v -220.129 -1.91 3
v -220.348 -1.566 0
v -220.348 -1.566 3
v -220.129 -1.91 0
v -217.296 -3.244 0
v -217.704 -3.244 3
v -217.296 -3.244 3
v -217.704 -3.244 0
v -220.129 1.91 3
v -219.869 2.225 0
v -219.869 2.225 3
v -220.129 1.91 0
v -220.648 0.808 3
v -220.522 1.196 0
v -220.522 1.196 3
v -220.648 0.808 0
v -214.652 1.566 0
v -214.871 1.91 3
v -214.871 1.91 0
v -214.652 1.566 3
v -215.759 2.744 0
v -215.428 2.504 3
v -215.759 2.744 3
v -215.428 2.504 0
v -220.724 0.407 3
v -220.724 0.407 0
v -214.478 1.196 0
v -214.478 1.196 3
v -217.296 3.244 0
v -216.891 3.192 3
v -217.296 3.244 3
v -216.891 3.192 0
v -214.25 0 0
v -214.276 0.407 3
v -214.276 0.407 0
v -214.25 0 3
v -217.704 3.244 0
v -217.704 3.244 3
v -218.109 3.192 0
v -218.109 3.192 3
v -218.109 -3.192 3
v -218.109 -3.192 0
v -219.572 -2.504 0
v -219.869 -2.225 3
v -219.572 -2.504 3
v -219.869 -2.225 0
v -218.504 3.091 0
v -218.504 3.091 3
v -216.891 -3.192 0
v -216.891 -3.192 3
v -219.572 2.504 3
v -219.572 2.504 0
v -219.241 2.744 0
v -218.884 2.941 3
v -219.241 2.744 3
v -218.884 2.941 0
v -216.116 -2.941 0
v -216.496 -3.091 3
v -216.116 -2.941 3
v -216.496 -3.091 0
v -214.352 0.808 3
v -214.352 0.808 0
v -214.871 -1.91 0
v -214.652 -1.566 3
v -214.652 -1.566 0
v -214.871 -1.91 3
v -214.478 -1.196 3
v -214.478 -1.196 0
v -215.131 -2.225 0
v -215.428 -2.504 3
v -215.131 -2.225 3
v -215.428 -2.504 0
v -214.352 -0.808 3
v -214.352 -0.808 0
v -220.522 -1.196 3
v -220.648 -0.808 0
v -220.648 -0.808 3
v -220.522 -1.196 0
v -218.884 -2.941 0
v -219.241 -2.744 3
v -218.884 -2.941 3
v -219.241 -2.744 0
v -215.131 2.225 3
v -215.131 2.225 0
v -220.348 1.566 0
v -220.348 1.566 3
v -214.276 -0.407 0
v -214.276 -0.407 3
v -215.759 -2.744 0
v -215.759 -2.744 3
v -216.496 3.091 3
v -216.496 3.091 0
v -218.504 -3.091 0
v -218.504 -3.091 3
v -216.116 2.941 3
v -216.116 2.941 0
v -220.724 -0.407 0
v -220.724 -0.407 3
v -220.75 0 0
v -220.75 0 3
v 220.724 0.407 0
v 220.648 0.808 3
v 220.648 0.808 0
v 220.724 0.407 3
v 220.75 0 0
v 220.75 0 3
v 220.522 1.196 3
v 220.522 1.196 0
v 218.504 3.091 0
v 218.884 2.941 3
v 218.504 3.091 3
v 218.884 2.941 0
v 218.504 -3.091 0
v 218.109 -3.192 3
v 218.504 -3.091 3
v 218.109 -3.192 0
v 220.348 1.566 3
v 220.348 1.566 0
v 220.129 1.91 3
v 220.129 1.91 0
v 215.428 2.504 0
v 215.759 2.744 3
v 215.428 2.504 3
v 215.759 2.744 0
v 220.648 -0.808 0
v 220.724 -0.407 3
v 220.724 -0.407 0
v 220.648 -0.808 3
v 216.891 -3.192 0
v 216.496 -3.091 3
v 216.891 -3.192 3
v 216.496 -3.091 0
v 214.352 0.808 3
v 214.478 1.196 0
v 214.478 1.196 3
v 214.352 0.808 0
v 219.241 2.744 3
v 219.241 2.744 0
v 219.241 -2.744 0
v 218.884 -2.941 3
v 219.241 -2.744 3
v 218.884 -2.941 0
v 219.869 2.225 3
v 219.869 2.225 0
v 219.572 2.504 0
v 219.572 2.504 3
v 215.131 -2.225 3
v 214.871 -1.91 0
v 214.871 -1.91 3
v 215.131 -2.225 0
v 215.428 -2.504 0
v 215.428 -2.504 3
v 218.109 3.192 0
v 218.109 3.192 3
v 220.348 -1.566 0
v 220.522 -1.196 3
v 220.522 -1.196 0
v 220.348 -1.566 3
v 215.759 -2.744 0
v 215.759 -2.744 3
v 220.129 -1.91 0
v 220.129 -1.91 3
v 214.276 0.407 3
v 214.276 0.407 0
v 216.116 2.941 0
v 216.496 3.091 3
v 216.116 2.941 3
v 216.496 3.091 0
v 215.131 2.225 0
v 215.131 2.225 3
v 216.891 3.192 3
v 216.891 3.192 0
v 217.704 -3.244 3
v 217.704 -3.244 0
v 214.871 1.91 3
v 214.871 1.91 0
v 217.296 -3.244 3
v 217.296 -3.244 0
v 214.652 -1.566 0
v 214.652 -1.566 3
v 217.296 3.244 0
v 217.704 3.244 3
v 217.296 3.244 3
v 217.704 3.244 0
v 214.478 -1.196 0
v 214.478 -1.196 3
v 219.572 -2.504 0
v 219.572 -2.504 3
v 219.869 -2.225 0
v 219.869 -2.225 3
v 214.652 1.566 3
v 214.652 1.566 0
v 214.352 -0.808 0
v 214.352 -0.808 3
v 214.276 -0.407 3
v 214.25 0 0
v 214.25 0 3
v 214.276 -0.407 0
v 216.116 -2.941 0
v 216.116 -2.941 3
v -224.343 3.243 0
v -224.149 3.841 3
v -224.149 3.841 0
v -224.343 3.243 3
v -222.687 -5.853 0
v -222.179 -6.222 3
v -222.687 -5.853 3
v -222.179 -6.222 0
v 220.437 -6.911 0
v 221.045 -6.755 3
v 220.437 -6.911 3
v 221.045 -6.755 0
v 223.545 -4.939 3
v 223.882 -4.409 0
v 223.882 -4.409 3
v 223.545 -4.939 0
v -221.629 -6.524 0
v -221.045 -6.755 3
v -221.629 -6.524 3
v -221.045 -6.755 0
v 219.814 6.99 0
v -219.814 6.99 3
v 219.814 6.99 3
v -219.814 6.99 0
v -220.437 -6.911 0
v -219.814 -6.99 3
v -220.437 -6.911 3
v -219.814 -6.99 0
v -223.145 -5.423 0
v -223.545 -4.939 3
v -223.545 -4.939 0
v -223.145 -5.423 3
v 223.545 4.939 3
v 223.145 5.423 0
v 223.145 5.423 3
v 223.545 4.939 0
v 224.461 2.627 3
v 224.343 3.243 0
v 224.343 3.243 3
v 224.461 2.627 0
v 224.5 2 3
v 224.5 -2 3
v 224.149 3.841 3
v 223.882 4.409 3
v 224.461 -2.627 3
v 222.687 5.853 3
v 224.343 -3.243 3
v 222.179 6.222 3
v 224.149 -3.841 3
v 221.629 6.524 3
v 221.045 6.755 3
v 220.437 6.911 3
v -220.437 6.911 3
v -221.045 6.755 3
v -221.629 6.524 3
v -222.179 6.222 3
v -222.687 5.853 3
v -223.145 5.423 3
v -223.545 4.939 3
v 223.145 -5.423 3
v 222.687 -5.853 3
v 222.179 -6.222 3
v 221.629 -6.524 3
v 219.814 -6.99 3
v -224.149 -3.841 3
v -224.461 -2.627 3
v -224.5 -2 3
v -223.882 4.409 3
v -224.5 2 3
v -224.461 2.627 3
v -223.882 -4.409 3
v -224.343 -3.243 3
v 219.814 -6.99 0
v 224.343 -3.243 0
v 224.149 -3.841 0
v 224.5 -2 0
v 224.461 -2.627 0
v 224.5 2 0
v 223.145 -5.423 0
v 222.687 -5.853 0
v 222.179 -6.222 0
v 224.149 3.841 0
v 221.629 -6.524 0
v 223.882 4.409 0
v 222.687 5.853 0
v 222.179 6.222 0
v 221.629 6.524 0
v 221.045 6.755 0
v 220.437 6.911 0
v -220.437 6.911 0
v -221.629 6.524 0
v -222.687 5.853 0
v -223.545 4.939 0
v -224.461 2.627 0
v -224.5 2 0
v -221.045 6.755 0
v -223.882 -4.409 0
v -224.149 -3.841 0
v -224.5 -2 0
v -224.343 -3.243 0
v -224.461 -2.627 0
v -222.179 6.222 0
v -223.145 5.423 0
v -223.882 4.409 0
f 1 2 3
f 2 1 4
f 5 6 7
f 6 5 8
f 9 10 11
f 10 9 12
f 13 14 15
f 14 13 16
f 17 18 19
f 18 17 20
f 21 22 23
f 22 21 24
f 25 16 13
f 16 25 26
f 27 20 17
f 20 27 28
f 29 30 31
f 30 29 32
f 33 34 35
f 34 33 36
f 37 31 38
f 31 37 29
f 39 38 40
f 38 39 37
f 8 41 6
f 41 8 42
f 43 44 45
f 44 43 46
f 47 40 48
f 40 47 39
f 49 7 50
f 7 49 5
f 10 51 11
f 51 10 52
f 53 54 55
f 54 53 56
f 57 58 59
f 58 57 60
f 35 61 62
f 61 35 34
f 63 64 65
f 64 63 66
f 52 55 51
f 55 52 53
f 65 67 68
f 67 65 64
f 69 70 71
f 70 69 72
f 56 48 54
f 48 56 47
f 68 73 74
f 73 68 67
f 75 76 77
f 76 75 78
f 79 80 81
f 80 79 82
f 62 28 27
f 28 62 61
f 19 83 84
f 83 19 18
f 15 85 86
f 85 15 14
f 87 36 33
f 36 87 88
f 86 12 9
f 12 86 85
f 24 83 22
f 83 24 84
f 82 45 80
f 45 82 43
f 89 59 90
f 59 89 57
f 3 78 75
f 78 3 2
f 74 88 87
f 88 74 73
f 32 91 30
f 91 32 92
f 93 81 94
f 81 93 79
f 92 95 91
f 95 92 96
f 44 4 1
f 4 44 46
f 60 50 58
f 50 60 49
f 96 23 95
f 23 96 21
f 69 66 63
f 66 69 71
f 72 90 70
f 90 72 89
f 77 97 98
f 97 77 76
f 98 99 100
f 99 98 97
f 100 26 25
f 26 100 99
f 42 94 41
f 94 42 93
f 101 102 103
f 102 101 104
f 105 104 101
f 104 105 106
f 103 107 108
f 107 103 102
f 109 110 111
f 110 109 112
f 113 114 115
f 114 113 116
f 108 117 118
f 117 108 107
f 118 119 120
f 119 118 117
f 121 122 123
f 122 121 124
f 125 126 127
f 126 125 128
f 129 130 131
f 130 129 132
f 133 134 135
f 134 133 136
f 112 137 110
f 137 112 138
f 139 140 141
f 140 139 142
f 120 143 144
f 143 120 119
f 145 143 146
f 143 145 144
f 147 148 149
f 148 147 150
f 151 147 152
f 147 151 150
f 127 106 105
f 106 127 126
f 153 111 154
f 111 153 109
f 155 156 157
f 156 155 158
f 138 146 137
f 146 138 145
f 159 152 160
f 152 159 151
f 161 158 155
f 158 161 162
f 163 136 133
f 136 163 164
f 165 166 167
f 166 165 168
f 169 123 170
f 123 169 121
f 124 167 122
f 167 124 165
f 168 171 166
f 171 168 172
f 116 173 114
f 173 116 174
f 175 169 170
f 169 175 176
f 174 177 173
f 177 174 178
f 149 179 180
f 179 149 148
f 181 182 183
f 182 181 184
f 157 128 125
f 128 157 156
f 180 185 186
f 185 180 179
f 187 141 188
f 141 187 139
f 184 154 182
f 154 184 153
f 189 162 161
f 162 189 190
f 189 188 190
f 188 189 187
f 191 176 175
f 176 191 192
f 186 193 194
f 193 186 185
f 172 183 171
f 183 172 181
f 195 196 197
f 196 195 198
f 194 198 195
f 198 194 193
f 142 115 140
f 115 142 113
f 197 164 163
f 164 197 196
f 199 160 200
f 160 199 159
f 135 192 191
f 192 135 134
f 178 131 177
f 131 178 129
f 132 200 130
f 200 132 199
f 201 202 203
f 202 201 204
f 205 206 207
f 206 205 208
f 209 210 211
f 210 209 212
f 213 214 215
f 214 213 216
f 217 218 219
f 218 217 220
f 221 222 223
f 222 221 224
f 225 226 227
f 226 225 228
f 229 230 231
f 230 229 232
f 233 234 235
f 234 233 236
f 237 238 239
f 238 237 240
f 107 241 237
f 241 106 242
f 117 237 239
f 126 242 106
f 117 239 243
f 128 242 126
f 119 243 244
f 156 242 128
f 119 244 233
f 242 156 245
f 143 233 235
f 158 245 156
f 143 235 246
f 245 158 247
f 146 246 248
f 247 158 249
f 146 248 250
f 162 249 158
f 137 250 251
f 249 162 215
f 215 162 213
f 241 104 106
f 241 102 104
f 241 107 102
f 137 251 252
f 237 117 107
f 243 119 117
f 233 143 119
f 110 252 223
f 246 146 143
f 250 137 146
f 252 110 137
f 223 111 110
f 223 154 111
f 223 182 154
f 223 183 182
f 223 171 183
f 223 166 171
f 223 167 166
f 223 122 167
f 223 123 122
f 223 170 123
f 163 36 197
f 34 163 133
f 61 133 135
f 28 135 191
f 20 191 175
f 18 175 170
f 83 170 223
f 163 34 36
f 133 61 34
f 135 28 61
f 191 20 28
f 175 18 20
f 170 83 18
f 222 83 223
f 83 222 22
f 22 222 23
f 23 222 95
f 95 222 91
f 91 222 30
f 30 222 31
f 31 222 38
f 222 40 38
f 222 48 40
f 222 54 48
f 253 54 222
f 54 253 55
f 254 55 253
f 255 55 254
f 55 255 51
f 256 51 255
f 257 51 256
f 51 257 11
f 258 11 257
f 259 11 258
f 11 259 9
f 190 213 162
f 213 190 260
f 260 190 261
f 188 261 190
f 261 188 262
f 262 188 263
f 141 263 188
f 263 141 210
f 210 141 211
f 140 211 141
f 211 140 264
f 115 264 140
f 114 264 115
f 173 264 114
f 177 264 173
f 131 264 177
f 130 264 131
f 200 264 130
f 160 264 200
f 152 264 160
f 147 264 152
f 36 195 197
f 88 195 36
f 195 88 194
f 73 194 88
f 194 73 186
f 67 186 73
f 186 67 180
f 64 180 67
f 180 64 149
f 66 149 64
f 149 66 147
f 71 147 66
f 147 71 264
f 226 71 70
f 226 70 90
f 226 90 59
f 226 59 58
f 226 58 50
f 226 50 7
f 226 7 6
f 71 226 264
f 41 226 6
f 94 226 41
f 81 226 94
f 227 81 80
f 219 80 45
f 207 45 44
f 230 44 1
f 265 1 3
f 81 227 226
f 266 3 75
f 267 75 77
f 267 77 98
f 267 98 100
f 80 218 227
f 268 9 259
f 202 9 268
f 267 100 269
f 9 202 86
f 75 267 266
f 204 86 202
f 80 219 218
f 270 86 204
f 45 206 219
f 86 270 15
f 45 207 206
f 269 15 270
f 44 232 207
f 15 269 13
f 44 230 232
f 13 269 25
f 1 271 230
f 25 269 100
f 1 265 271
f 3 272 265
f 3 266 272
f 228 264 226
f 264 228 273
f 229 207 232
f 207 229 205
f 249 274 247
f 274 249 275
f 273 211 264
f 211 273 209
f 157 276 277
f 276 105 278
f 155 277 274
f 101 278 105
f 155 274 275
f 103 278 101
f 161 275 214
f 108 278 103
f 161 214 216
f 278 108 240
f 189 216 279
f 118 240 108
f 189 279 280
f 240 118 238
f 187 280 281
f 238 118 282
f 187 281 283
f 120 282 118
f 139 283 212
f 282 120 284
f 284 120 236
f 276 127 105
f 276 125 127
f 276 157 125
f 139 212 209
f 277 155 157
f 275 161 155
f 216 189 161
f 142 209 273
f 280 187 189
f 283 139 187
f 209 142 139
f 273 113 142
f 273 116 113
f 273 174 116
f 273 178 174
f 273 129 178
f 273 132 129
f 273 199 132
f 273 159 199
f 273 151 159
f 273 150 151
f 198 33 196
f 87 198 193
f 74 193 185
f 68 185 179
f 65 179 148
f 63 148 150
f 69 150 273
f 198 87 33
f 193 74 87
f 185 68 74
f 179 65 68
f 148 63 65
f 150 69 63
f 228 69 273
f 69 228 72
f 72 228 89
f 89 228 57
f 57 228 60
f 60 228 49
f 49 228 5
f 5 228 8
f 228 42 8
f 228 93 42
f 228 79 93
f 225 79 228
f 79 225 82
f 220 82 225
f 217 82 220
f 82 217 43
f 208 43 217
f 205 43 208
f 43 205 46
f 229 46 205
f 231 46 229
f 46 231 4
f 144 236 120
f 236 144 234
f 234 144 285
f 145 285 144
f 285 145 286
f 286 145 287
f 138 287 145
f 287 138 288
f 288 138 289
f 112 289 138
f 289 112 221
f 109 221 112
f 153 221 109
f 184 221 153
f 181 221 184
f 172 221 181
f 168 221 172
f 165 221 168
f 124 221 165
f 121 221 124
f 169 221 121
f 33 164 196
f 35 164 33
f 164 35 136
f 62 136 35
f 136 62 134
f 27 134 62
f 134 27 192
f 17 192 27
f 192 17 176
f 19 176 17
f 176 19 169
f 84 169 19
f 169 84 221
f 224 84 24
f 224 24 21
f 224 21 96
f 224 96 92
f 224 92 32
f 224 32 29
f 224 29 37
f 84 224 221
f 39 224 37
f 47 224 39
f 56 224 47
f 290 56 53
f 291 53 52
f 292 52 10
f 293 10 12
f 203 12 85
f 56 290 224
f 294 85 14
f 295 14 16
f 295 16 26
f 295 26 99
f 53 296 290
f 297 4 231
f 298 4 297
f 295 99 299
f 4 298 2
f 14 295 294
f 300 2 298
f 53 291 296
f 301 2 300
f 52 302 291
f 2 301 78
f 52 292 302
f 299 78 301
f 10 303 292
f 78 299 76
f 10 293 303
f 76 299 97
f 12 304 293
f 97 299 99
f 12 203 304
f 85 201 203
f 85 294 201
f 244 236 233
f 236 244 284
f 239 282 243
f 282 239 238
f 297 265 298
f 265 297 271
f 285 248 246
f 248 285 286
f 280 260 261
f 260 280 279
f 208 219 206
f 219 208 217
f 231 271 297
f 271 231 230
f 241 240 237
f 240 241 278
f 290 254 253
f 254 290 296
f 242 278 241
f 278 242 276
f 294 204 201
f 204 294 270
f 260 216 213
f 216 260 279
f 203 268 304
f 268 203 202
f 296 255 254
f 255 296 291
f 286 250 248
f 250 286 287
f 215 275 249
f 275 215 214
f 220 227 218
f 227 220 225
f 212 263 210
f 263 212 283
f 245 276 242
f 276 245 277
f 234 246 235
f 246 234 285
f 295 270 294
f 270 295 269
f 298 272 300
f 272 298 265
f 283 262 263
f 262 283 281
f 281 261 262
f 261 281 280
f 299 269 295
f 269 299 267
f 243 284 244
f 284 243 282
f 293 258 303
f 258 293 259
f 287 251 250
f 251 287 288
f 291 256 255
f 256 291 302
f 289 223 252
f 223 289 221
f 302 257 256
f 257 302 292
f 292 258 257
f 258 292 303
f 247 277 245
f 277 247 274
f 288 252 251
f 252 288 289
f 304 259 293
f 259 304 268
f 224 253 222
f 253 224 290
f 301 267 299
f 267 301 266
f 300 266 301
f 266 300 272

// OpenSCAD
$fn = 50;


difference() {
	union() {
		hull() {
			translate(v = [-219.5000000000, 2.0000000000, 0]) {
				cylinder(h = 3, r = 5);
			}
			translate(v = [219.5000000000, 2.0000000000, 0]) {
				cylinder(h = 3, r = 5);
			}
			translate(v = [-219.5000000000, -2.0000000000, 0]) {
				cylinder(h = 3, r = 5);
			}
			translate(v = [219.5000000000, -2.0000000000, 0]) {
				cylinder(h = 3, r = 5);
			}
		}
	}
	union() {
		translate(v = [-217.5000000000, 0.0000000000, -100.0000000000]) {
			cylinder(h = 200, r = 3.2500000000);
		}
		translate(v = [-217.5000000000, 0.0000000000, -100.0000000000]) {
			cylinder(h = 200, r = 3.2500000000);
		}
		translate(v = [217.5000000000, 0.0000000000, -100.0000000000]) {
			cylinder(h = 200, r = 3.2500000000);
		}
		translate(v = [217.5000000000, 0.0000000000, -100.0000000000]) {
			cylinder(h = 200, r = 3.2500000000);
		}
	}
}
